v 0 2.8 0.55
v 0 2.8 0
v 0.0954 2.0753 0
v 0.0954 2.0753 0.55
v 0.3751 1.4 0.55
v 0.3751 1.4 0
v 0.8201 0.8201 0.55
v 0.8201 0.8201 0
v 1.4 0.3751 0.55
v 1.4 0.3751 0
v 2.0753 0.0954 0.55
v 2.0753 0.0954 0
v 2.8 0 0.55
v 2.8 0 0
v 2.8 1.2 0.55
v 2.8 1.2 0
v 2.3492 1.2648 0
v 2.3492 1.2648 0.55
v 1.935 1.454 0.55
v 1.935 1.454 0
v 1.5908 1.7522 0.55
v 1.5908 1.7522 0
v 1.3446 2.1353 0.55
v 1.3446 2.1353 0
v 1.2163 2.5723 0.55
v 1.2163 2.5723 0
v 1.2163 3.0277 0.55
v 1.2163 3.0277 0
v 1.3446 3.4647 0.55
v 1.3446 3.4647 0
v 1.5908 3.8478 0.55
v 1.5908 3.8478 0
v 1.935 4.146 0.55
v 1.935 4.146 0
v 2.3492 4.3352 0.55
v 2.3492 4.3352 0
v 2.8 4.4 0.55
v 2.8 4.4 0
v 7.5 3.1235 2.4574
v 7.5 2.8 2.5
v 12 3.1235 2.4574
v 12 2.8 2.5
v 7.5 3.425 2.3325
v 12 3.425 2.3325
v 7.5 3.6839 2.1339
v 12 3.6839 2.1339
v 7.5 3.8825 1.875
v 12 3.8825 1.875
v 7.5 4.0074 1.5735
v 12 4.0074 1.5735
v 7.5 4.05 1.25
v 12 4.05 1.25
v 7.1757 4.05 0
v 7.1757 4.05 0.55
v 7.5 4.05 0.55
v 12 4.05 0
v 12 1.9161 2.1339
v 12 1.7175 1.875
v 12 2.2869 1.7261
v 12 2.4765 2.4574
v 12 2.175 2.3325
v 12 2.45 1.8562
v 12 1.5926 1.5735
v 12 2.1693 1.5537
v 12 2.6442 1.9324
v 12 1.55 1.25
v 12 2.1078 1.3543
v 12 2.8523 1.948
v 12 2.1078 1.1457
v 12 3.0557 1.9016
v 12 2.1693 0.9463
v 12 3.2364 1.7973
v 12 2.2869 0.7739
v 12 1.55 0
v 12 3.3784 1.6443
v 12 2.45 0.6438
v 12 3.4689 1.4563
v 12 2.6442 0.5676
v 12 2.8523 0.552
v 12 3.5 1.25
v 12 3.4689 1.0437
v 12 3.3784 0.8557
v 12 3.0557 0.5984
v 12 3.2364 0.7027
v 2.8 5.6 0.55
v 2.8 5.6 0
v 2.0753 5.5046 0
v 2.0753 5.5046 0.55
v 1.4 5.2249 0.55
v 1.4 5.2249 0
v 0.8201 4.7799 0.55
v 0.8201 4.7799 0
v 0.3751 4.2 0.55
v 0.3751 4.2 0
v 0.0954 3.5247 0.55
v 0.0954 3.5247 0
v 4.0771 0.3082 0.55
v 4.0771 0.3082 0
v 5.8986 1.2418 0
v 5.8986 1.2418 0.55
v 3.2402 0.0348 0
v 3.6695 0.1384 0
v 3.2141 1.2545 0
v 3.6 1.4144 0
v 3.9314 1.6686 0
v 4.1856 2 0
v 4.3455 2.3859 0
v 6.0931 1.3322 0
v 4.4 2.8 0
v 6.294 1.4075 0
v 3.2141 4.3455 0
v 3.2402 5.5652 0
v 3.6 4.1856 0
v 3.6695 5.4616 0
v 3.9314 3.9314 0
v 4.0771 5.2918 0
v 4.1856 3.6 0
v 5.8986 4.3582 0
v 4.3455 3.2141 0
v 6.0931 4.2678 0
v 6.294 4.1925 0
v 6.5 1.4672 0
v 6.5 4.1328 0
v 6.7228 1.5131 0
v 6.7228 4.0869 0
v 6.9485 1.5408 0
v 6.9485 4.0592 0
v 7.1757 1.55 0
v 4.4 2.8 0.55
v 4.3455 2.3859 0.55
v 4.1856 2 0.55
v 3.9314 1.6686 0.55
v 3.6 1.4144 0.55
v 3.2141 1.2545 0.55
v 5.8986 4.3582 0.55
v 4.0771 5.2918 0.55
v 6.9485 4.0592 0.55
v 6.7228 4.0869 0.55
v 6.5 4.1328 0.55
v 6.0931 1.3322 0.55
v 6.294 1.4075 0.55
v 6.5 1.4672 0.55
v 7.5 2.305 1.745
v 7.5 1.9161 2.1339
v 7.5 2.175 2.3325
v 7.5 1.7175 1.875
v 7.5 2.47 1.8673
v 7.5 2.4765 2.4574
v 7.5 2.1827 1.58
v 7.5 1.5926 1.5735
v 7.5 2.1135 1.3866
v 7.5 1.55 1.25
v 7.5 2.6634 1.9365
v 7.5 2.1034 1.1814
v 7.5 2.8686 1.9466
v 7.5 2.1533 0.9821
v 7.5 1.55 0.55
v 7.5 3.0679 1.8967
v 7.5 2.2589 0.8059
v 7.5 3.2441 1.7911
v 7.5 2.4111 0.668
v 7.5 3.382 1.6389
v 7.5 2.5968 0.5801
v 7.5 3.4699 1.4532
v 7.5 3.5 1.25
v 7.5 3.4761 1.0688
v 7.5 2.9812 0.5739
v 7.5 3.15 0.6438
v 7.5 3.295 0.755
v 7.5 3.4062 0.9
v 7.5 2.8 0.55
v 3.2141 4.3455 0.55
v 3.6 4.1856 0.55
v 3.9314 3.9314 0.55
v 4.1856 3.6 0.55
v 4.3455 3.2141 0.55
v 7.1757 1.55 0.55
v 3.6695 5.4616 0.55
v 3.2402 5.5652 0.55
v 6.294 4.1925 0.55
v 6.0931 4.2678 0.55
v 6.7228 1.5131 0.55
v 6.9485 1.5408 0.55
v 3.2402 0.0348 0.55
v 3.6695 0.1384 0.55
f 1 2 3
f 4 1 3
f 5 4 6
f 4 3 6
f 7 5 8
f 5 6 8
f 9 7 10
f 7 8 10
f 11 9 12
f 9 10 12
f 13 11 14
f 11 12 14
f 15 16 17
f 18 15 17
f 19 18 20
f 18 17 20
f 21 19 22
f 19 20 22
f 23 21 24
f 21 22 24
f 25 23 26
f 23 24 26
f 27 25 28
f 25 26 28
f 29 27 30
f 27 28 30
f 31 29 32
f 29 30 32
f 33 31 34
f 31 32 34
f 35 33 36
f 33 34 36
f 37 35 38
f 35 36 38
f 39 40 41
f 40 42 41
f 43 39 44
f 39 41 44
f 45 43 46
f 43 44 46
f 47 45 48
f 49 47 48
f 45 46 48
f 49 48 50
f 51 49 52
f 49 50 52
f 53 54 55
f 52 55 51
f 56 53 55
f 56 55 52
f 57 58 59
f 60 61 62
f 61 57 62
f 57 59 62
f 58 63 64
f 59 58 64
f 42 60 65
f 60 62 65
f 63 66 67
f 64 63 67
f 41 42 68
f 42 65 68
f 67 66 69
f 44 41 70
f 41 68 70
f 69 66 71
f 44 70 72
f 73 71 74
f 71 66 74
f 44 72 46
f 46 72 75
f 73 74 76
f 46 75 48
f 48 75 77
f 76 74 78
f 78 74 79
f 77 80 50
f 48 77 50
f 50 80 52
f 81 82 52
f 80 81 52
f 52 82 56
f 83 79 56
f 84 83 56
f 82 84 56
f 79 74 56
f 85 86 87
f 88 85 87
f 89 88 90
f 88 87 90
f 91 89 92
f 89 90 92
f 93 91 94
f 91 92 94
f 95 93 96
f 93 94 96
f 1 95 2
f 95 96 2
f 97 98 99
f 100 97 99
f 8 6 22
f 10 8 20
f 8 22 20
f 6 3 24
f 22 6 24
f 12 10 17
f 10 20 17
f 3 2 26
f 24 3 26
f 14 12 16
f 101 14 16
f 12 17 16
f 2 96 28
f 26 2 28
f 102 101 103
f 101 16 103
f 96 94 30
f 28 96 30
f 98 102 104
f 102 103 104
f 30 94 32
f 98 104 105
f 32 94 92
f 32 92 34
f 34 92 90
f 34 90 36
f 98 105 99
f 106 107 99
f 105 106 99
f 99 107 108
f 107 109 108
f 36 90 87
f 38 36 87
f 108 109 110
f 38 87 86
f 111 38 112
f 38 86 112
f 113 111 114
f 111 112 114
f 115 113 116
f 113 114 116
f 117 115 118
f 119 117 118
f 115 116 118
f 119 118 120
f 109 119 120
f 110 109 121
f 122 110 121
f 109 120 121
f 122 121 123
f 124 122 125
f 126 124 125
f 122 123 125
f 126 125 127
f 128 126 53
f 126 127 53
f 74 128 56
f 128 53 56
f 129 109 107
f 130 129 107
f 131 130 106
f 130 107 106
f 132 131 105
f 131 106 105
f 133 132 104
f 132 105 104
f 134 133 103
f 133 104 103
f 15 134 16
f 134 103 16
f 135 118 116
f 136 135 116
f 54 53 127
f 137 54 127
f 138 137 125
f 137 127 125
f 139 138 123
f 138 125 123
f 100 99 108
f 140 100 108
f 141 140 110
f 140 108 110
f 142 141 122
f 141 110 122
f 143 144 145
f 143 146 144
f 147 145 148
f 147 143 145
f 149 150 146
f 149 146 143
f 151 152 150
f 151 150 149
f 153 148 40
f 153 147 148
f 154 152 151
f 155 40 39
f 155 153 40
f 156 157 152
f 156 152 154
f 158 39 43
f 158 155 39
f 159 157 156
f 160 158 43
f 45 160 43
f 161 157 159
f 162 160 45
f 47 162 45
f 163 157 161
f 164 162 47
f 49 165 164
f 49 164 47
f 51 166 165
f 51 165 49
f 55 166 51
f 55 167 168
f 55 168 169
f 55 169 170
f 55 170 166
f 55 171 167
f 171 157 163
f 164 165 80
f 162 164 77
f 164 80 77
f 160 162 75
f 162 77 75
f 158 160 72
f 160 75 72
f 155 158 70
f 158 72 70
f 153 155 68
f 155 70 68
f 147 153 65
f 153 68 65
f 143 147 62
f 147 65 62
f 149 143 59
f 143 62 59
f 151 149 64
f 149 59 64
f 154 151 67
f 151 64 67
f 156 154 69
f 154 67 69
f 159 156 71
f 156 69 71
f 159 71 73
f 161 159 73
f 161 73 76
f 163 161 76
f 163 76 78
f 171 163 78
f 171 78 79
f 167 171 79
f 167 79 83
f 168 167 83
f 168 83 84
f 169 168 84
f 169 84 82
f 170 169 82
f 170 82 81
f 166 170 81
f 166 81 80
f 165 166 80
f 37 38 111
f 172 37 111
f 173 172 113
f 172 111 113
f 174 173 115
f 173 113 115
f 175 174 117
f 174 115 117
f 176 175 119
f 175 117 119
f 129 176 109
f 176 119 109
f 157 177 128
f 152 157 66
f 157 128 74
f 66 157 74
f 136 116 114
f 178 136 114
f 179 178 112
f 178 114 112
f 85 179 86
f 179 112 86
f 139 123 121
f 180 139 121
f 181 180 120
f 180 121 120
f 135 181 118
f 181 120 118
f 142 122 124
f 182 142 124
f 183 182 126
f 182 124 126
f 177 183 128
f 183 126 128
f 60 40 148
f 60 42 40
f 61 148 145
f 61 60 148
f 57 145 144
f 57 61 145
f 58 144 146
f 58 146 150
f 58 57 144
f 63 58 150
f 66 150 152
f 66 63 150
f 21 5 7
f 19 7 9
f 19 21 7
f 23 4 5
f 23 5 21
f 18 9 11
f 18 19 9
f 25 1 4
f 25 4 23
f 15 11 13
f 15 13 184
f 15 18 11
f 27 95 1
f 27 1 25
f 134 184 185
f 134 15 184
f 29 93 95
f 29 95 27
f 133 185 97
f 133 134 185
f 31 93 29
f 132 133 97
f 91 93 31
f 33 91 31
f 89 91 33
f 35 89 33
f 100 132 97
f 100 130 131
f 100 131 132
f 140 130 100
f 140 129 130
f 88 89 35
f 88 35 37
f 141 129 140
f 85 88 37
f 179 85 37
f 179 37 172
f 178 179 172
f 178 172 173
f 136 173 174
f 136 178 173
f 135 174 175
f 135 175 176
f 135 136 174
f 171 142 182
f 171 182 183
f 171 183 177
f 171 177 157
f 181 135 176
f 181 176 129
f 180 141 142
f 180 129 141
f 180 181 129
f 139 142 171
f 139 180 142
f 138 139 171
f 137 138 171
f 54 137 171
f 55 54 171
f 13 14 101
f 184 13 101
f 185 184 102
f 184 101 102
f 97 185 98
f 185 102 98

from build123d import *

# Parameters (mm, degrees)
F1_DEPTH = 0.55
F2_W     = 4.5
F2_H     = 2.5
F3_DEPTH = 1.95
F4_R     = 1.24999
F5_R     = 0.7
F6_DEPTH = 25


# Not quite as in the source:
# - a fillet or chamfer is up to 0.001 mm smaller than in the source, because OpenCascade refuses the exact size


with BuildPart() as f1:
    # F0 (on Top) → F1 (new body)
    with BuildSketch(Plane.XY):
        with BuildLine():
            Line((7.1757397782, 1.55), (12, 1.55))
            Line((12, 1.55), (12, 4.05))
            Line((12, 4.05), (7.1757397782, 4.05))
            ThreePointArc((7.1757397782, 4.05), (6.8353451552, 4.0707678217), (6.5, 4.1327632138))
            ThreePointArc((6.5, 4.1327632138), (6.1928359056, 4.2281876541), (5.8986420809, 4.3582091838))
            Line((5.8986420809, 4.3582091838), (4.0770976972, 5.2917908162))
            ThreePointArc((4.0770976972, 5.2917908162), (3.4568811592, 5.5218572965), (2.8, 5.6))
            Line((2.8, 5.6), (2.8, 4.4))
            ThreePointArc((2.8, 4.4), (3.9313708499, 3.9313708499), (4.4, 2.8))
            ThreePointArc((4.4, 2.8), (3.9313708499, 1.6686291501), (2.8, 1.2))
            Line((2.8, 1.2), (2.8, 0))
            ThreePointArc((2.8, 0), (3.4568811592, 0.0781427035), (4.0770976972, 0.3082091838))
            Line((4.0770976972, 0.3082091838), (5.8986420809, 1.2417908162))
            ThreePointArc((5.8986420809, 1.2417908162), (6.1928359056, 1.3718123459), (6.5, 1.4672367862))
            ThreePointArc((6.5, 1.4672367862), (6.8353451552, 1.5292321783), (7.1757397782, 1.55))
        make_face()
        with BuildLine():
            ThreePointArc((0, 2.8), (0.8201010127, 0.8201010127), (2.8, 0))
            Line((2.8, 0), (2.8, 1.2))
            ThreePointArc((2.8, 1.2), (1.2, 2.8), (2.8, 4.4))
            Line((2.8, 4.4), (2.8, 5.6))
            ThreePointArc((2.8, 5.6), (0.8201010127, 4.7798989873), (0, 2.8))
        make_face()
    extrude(amount=F1_DEPTH)

    # F2 (on face) → F3 (join)
    with BuildSketch(Plane.XY.offset(0.55)):
        with Locations((9.75, 2.8)):
            Rectangle(F2_W, F2_H)
    extrude(amount=F3_DEPTH)

    # F4 (radius 1.25 in the source; OpenCascade refuses exactly that, so slightly less here)
    f4_edges = [f1.edges().sort_by_distance(p)[0] for p in [
        (9.75, 1.55, 2.5),
        (9.75, 4.05, 2.5),
    ]]
    fillet(f4_edges, radius=F4_R)

    # F5 (on face) → F6 (cut)
    with BuildSketch(Plane.YZ.offset(12)):
        with Locations((2.8, 1.25)):
            Circle(F5_R)
    extrude(amount=-F6_DEPTH, mode=Mode.SUBTRACT)


solid = f1.part
